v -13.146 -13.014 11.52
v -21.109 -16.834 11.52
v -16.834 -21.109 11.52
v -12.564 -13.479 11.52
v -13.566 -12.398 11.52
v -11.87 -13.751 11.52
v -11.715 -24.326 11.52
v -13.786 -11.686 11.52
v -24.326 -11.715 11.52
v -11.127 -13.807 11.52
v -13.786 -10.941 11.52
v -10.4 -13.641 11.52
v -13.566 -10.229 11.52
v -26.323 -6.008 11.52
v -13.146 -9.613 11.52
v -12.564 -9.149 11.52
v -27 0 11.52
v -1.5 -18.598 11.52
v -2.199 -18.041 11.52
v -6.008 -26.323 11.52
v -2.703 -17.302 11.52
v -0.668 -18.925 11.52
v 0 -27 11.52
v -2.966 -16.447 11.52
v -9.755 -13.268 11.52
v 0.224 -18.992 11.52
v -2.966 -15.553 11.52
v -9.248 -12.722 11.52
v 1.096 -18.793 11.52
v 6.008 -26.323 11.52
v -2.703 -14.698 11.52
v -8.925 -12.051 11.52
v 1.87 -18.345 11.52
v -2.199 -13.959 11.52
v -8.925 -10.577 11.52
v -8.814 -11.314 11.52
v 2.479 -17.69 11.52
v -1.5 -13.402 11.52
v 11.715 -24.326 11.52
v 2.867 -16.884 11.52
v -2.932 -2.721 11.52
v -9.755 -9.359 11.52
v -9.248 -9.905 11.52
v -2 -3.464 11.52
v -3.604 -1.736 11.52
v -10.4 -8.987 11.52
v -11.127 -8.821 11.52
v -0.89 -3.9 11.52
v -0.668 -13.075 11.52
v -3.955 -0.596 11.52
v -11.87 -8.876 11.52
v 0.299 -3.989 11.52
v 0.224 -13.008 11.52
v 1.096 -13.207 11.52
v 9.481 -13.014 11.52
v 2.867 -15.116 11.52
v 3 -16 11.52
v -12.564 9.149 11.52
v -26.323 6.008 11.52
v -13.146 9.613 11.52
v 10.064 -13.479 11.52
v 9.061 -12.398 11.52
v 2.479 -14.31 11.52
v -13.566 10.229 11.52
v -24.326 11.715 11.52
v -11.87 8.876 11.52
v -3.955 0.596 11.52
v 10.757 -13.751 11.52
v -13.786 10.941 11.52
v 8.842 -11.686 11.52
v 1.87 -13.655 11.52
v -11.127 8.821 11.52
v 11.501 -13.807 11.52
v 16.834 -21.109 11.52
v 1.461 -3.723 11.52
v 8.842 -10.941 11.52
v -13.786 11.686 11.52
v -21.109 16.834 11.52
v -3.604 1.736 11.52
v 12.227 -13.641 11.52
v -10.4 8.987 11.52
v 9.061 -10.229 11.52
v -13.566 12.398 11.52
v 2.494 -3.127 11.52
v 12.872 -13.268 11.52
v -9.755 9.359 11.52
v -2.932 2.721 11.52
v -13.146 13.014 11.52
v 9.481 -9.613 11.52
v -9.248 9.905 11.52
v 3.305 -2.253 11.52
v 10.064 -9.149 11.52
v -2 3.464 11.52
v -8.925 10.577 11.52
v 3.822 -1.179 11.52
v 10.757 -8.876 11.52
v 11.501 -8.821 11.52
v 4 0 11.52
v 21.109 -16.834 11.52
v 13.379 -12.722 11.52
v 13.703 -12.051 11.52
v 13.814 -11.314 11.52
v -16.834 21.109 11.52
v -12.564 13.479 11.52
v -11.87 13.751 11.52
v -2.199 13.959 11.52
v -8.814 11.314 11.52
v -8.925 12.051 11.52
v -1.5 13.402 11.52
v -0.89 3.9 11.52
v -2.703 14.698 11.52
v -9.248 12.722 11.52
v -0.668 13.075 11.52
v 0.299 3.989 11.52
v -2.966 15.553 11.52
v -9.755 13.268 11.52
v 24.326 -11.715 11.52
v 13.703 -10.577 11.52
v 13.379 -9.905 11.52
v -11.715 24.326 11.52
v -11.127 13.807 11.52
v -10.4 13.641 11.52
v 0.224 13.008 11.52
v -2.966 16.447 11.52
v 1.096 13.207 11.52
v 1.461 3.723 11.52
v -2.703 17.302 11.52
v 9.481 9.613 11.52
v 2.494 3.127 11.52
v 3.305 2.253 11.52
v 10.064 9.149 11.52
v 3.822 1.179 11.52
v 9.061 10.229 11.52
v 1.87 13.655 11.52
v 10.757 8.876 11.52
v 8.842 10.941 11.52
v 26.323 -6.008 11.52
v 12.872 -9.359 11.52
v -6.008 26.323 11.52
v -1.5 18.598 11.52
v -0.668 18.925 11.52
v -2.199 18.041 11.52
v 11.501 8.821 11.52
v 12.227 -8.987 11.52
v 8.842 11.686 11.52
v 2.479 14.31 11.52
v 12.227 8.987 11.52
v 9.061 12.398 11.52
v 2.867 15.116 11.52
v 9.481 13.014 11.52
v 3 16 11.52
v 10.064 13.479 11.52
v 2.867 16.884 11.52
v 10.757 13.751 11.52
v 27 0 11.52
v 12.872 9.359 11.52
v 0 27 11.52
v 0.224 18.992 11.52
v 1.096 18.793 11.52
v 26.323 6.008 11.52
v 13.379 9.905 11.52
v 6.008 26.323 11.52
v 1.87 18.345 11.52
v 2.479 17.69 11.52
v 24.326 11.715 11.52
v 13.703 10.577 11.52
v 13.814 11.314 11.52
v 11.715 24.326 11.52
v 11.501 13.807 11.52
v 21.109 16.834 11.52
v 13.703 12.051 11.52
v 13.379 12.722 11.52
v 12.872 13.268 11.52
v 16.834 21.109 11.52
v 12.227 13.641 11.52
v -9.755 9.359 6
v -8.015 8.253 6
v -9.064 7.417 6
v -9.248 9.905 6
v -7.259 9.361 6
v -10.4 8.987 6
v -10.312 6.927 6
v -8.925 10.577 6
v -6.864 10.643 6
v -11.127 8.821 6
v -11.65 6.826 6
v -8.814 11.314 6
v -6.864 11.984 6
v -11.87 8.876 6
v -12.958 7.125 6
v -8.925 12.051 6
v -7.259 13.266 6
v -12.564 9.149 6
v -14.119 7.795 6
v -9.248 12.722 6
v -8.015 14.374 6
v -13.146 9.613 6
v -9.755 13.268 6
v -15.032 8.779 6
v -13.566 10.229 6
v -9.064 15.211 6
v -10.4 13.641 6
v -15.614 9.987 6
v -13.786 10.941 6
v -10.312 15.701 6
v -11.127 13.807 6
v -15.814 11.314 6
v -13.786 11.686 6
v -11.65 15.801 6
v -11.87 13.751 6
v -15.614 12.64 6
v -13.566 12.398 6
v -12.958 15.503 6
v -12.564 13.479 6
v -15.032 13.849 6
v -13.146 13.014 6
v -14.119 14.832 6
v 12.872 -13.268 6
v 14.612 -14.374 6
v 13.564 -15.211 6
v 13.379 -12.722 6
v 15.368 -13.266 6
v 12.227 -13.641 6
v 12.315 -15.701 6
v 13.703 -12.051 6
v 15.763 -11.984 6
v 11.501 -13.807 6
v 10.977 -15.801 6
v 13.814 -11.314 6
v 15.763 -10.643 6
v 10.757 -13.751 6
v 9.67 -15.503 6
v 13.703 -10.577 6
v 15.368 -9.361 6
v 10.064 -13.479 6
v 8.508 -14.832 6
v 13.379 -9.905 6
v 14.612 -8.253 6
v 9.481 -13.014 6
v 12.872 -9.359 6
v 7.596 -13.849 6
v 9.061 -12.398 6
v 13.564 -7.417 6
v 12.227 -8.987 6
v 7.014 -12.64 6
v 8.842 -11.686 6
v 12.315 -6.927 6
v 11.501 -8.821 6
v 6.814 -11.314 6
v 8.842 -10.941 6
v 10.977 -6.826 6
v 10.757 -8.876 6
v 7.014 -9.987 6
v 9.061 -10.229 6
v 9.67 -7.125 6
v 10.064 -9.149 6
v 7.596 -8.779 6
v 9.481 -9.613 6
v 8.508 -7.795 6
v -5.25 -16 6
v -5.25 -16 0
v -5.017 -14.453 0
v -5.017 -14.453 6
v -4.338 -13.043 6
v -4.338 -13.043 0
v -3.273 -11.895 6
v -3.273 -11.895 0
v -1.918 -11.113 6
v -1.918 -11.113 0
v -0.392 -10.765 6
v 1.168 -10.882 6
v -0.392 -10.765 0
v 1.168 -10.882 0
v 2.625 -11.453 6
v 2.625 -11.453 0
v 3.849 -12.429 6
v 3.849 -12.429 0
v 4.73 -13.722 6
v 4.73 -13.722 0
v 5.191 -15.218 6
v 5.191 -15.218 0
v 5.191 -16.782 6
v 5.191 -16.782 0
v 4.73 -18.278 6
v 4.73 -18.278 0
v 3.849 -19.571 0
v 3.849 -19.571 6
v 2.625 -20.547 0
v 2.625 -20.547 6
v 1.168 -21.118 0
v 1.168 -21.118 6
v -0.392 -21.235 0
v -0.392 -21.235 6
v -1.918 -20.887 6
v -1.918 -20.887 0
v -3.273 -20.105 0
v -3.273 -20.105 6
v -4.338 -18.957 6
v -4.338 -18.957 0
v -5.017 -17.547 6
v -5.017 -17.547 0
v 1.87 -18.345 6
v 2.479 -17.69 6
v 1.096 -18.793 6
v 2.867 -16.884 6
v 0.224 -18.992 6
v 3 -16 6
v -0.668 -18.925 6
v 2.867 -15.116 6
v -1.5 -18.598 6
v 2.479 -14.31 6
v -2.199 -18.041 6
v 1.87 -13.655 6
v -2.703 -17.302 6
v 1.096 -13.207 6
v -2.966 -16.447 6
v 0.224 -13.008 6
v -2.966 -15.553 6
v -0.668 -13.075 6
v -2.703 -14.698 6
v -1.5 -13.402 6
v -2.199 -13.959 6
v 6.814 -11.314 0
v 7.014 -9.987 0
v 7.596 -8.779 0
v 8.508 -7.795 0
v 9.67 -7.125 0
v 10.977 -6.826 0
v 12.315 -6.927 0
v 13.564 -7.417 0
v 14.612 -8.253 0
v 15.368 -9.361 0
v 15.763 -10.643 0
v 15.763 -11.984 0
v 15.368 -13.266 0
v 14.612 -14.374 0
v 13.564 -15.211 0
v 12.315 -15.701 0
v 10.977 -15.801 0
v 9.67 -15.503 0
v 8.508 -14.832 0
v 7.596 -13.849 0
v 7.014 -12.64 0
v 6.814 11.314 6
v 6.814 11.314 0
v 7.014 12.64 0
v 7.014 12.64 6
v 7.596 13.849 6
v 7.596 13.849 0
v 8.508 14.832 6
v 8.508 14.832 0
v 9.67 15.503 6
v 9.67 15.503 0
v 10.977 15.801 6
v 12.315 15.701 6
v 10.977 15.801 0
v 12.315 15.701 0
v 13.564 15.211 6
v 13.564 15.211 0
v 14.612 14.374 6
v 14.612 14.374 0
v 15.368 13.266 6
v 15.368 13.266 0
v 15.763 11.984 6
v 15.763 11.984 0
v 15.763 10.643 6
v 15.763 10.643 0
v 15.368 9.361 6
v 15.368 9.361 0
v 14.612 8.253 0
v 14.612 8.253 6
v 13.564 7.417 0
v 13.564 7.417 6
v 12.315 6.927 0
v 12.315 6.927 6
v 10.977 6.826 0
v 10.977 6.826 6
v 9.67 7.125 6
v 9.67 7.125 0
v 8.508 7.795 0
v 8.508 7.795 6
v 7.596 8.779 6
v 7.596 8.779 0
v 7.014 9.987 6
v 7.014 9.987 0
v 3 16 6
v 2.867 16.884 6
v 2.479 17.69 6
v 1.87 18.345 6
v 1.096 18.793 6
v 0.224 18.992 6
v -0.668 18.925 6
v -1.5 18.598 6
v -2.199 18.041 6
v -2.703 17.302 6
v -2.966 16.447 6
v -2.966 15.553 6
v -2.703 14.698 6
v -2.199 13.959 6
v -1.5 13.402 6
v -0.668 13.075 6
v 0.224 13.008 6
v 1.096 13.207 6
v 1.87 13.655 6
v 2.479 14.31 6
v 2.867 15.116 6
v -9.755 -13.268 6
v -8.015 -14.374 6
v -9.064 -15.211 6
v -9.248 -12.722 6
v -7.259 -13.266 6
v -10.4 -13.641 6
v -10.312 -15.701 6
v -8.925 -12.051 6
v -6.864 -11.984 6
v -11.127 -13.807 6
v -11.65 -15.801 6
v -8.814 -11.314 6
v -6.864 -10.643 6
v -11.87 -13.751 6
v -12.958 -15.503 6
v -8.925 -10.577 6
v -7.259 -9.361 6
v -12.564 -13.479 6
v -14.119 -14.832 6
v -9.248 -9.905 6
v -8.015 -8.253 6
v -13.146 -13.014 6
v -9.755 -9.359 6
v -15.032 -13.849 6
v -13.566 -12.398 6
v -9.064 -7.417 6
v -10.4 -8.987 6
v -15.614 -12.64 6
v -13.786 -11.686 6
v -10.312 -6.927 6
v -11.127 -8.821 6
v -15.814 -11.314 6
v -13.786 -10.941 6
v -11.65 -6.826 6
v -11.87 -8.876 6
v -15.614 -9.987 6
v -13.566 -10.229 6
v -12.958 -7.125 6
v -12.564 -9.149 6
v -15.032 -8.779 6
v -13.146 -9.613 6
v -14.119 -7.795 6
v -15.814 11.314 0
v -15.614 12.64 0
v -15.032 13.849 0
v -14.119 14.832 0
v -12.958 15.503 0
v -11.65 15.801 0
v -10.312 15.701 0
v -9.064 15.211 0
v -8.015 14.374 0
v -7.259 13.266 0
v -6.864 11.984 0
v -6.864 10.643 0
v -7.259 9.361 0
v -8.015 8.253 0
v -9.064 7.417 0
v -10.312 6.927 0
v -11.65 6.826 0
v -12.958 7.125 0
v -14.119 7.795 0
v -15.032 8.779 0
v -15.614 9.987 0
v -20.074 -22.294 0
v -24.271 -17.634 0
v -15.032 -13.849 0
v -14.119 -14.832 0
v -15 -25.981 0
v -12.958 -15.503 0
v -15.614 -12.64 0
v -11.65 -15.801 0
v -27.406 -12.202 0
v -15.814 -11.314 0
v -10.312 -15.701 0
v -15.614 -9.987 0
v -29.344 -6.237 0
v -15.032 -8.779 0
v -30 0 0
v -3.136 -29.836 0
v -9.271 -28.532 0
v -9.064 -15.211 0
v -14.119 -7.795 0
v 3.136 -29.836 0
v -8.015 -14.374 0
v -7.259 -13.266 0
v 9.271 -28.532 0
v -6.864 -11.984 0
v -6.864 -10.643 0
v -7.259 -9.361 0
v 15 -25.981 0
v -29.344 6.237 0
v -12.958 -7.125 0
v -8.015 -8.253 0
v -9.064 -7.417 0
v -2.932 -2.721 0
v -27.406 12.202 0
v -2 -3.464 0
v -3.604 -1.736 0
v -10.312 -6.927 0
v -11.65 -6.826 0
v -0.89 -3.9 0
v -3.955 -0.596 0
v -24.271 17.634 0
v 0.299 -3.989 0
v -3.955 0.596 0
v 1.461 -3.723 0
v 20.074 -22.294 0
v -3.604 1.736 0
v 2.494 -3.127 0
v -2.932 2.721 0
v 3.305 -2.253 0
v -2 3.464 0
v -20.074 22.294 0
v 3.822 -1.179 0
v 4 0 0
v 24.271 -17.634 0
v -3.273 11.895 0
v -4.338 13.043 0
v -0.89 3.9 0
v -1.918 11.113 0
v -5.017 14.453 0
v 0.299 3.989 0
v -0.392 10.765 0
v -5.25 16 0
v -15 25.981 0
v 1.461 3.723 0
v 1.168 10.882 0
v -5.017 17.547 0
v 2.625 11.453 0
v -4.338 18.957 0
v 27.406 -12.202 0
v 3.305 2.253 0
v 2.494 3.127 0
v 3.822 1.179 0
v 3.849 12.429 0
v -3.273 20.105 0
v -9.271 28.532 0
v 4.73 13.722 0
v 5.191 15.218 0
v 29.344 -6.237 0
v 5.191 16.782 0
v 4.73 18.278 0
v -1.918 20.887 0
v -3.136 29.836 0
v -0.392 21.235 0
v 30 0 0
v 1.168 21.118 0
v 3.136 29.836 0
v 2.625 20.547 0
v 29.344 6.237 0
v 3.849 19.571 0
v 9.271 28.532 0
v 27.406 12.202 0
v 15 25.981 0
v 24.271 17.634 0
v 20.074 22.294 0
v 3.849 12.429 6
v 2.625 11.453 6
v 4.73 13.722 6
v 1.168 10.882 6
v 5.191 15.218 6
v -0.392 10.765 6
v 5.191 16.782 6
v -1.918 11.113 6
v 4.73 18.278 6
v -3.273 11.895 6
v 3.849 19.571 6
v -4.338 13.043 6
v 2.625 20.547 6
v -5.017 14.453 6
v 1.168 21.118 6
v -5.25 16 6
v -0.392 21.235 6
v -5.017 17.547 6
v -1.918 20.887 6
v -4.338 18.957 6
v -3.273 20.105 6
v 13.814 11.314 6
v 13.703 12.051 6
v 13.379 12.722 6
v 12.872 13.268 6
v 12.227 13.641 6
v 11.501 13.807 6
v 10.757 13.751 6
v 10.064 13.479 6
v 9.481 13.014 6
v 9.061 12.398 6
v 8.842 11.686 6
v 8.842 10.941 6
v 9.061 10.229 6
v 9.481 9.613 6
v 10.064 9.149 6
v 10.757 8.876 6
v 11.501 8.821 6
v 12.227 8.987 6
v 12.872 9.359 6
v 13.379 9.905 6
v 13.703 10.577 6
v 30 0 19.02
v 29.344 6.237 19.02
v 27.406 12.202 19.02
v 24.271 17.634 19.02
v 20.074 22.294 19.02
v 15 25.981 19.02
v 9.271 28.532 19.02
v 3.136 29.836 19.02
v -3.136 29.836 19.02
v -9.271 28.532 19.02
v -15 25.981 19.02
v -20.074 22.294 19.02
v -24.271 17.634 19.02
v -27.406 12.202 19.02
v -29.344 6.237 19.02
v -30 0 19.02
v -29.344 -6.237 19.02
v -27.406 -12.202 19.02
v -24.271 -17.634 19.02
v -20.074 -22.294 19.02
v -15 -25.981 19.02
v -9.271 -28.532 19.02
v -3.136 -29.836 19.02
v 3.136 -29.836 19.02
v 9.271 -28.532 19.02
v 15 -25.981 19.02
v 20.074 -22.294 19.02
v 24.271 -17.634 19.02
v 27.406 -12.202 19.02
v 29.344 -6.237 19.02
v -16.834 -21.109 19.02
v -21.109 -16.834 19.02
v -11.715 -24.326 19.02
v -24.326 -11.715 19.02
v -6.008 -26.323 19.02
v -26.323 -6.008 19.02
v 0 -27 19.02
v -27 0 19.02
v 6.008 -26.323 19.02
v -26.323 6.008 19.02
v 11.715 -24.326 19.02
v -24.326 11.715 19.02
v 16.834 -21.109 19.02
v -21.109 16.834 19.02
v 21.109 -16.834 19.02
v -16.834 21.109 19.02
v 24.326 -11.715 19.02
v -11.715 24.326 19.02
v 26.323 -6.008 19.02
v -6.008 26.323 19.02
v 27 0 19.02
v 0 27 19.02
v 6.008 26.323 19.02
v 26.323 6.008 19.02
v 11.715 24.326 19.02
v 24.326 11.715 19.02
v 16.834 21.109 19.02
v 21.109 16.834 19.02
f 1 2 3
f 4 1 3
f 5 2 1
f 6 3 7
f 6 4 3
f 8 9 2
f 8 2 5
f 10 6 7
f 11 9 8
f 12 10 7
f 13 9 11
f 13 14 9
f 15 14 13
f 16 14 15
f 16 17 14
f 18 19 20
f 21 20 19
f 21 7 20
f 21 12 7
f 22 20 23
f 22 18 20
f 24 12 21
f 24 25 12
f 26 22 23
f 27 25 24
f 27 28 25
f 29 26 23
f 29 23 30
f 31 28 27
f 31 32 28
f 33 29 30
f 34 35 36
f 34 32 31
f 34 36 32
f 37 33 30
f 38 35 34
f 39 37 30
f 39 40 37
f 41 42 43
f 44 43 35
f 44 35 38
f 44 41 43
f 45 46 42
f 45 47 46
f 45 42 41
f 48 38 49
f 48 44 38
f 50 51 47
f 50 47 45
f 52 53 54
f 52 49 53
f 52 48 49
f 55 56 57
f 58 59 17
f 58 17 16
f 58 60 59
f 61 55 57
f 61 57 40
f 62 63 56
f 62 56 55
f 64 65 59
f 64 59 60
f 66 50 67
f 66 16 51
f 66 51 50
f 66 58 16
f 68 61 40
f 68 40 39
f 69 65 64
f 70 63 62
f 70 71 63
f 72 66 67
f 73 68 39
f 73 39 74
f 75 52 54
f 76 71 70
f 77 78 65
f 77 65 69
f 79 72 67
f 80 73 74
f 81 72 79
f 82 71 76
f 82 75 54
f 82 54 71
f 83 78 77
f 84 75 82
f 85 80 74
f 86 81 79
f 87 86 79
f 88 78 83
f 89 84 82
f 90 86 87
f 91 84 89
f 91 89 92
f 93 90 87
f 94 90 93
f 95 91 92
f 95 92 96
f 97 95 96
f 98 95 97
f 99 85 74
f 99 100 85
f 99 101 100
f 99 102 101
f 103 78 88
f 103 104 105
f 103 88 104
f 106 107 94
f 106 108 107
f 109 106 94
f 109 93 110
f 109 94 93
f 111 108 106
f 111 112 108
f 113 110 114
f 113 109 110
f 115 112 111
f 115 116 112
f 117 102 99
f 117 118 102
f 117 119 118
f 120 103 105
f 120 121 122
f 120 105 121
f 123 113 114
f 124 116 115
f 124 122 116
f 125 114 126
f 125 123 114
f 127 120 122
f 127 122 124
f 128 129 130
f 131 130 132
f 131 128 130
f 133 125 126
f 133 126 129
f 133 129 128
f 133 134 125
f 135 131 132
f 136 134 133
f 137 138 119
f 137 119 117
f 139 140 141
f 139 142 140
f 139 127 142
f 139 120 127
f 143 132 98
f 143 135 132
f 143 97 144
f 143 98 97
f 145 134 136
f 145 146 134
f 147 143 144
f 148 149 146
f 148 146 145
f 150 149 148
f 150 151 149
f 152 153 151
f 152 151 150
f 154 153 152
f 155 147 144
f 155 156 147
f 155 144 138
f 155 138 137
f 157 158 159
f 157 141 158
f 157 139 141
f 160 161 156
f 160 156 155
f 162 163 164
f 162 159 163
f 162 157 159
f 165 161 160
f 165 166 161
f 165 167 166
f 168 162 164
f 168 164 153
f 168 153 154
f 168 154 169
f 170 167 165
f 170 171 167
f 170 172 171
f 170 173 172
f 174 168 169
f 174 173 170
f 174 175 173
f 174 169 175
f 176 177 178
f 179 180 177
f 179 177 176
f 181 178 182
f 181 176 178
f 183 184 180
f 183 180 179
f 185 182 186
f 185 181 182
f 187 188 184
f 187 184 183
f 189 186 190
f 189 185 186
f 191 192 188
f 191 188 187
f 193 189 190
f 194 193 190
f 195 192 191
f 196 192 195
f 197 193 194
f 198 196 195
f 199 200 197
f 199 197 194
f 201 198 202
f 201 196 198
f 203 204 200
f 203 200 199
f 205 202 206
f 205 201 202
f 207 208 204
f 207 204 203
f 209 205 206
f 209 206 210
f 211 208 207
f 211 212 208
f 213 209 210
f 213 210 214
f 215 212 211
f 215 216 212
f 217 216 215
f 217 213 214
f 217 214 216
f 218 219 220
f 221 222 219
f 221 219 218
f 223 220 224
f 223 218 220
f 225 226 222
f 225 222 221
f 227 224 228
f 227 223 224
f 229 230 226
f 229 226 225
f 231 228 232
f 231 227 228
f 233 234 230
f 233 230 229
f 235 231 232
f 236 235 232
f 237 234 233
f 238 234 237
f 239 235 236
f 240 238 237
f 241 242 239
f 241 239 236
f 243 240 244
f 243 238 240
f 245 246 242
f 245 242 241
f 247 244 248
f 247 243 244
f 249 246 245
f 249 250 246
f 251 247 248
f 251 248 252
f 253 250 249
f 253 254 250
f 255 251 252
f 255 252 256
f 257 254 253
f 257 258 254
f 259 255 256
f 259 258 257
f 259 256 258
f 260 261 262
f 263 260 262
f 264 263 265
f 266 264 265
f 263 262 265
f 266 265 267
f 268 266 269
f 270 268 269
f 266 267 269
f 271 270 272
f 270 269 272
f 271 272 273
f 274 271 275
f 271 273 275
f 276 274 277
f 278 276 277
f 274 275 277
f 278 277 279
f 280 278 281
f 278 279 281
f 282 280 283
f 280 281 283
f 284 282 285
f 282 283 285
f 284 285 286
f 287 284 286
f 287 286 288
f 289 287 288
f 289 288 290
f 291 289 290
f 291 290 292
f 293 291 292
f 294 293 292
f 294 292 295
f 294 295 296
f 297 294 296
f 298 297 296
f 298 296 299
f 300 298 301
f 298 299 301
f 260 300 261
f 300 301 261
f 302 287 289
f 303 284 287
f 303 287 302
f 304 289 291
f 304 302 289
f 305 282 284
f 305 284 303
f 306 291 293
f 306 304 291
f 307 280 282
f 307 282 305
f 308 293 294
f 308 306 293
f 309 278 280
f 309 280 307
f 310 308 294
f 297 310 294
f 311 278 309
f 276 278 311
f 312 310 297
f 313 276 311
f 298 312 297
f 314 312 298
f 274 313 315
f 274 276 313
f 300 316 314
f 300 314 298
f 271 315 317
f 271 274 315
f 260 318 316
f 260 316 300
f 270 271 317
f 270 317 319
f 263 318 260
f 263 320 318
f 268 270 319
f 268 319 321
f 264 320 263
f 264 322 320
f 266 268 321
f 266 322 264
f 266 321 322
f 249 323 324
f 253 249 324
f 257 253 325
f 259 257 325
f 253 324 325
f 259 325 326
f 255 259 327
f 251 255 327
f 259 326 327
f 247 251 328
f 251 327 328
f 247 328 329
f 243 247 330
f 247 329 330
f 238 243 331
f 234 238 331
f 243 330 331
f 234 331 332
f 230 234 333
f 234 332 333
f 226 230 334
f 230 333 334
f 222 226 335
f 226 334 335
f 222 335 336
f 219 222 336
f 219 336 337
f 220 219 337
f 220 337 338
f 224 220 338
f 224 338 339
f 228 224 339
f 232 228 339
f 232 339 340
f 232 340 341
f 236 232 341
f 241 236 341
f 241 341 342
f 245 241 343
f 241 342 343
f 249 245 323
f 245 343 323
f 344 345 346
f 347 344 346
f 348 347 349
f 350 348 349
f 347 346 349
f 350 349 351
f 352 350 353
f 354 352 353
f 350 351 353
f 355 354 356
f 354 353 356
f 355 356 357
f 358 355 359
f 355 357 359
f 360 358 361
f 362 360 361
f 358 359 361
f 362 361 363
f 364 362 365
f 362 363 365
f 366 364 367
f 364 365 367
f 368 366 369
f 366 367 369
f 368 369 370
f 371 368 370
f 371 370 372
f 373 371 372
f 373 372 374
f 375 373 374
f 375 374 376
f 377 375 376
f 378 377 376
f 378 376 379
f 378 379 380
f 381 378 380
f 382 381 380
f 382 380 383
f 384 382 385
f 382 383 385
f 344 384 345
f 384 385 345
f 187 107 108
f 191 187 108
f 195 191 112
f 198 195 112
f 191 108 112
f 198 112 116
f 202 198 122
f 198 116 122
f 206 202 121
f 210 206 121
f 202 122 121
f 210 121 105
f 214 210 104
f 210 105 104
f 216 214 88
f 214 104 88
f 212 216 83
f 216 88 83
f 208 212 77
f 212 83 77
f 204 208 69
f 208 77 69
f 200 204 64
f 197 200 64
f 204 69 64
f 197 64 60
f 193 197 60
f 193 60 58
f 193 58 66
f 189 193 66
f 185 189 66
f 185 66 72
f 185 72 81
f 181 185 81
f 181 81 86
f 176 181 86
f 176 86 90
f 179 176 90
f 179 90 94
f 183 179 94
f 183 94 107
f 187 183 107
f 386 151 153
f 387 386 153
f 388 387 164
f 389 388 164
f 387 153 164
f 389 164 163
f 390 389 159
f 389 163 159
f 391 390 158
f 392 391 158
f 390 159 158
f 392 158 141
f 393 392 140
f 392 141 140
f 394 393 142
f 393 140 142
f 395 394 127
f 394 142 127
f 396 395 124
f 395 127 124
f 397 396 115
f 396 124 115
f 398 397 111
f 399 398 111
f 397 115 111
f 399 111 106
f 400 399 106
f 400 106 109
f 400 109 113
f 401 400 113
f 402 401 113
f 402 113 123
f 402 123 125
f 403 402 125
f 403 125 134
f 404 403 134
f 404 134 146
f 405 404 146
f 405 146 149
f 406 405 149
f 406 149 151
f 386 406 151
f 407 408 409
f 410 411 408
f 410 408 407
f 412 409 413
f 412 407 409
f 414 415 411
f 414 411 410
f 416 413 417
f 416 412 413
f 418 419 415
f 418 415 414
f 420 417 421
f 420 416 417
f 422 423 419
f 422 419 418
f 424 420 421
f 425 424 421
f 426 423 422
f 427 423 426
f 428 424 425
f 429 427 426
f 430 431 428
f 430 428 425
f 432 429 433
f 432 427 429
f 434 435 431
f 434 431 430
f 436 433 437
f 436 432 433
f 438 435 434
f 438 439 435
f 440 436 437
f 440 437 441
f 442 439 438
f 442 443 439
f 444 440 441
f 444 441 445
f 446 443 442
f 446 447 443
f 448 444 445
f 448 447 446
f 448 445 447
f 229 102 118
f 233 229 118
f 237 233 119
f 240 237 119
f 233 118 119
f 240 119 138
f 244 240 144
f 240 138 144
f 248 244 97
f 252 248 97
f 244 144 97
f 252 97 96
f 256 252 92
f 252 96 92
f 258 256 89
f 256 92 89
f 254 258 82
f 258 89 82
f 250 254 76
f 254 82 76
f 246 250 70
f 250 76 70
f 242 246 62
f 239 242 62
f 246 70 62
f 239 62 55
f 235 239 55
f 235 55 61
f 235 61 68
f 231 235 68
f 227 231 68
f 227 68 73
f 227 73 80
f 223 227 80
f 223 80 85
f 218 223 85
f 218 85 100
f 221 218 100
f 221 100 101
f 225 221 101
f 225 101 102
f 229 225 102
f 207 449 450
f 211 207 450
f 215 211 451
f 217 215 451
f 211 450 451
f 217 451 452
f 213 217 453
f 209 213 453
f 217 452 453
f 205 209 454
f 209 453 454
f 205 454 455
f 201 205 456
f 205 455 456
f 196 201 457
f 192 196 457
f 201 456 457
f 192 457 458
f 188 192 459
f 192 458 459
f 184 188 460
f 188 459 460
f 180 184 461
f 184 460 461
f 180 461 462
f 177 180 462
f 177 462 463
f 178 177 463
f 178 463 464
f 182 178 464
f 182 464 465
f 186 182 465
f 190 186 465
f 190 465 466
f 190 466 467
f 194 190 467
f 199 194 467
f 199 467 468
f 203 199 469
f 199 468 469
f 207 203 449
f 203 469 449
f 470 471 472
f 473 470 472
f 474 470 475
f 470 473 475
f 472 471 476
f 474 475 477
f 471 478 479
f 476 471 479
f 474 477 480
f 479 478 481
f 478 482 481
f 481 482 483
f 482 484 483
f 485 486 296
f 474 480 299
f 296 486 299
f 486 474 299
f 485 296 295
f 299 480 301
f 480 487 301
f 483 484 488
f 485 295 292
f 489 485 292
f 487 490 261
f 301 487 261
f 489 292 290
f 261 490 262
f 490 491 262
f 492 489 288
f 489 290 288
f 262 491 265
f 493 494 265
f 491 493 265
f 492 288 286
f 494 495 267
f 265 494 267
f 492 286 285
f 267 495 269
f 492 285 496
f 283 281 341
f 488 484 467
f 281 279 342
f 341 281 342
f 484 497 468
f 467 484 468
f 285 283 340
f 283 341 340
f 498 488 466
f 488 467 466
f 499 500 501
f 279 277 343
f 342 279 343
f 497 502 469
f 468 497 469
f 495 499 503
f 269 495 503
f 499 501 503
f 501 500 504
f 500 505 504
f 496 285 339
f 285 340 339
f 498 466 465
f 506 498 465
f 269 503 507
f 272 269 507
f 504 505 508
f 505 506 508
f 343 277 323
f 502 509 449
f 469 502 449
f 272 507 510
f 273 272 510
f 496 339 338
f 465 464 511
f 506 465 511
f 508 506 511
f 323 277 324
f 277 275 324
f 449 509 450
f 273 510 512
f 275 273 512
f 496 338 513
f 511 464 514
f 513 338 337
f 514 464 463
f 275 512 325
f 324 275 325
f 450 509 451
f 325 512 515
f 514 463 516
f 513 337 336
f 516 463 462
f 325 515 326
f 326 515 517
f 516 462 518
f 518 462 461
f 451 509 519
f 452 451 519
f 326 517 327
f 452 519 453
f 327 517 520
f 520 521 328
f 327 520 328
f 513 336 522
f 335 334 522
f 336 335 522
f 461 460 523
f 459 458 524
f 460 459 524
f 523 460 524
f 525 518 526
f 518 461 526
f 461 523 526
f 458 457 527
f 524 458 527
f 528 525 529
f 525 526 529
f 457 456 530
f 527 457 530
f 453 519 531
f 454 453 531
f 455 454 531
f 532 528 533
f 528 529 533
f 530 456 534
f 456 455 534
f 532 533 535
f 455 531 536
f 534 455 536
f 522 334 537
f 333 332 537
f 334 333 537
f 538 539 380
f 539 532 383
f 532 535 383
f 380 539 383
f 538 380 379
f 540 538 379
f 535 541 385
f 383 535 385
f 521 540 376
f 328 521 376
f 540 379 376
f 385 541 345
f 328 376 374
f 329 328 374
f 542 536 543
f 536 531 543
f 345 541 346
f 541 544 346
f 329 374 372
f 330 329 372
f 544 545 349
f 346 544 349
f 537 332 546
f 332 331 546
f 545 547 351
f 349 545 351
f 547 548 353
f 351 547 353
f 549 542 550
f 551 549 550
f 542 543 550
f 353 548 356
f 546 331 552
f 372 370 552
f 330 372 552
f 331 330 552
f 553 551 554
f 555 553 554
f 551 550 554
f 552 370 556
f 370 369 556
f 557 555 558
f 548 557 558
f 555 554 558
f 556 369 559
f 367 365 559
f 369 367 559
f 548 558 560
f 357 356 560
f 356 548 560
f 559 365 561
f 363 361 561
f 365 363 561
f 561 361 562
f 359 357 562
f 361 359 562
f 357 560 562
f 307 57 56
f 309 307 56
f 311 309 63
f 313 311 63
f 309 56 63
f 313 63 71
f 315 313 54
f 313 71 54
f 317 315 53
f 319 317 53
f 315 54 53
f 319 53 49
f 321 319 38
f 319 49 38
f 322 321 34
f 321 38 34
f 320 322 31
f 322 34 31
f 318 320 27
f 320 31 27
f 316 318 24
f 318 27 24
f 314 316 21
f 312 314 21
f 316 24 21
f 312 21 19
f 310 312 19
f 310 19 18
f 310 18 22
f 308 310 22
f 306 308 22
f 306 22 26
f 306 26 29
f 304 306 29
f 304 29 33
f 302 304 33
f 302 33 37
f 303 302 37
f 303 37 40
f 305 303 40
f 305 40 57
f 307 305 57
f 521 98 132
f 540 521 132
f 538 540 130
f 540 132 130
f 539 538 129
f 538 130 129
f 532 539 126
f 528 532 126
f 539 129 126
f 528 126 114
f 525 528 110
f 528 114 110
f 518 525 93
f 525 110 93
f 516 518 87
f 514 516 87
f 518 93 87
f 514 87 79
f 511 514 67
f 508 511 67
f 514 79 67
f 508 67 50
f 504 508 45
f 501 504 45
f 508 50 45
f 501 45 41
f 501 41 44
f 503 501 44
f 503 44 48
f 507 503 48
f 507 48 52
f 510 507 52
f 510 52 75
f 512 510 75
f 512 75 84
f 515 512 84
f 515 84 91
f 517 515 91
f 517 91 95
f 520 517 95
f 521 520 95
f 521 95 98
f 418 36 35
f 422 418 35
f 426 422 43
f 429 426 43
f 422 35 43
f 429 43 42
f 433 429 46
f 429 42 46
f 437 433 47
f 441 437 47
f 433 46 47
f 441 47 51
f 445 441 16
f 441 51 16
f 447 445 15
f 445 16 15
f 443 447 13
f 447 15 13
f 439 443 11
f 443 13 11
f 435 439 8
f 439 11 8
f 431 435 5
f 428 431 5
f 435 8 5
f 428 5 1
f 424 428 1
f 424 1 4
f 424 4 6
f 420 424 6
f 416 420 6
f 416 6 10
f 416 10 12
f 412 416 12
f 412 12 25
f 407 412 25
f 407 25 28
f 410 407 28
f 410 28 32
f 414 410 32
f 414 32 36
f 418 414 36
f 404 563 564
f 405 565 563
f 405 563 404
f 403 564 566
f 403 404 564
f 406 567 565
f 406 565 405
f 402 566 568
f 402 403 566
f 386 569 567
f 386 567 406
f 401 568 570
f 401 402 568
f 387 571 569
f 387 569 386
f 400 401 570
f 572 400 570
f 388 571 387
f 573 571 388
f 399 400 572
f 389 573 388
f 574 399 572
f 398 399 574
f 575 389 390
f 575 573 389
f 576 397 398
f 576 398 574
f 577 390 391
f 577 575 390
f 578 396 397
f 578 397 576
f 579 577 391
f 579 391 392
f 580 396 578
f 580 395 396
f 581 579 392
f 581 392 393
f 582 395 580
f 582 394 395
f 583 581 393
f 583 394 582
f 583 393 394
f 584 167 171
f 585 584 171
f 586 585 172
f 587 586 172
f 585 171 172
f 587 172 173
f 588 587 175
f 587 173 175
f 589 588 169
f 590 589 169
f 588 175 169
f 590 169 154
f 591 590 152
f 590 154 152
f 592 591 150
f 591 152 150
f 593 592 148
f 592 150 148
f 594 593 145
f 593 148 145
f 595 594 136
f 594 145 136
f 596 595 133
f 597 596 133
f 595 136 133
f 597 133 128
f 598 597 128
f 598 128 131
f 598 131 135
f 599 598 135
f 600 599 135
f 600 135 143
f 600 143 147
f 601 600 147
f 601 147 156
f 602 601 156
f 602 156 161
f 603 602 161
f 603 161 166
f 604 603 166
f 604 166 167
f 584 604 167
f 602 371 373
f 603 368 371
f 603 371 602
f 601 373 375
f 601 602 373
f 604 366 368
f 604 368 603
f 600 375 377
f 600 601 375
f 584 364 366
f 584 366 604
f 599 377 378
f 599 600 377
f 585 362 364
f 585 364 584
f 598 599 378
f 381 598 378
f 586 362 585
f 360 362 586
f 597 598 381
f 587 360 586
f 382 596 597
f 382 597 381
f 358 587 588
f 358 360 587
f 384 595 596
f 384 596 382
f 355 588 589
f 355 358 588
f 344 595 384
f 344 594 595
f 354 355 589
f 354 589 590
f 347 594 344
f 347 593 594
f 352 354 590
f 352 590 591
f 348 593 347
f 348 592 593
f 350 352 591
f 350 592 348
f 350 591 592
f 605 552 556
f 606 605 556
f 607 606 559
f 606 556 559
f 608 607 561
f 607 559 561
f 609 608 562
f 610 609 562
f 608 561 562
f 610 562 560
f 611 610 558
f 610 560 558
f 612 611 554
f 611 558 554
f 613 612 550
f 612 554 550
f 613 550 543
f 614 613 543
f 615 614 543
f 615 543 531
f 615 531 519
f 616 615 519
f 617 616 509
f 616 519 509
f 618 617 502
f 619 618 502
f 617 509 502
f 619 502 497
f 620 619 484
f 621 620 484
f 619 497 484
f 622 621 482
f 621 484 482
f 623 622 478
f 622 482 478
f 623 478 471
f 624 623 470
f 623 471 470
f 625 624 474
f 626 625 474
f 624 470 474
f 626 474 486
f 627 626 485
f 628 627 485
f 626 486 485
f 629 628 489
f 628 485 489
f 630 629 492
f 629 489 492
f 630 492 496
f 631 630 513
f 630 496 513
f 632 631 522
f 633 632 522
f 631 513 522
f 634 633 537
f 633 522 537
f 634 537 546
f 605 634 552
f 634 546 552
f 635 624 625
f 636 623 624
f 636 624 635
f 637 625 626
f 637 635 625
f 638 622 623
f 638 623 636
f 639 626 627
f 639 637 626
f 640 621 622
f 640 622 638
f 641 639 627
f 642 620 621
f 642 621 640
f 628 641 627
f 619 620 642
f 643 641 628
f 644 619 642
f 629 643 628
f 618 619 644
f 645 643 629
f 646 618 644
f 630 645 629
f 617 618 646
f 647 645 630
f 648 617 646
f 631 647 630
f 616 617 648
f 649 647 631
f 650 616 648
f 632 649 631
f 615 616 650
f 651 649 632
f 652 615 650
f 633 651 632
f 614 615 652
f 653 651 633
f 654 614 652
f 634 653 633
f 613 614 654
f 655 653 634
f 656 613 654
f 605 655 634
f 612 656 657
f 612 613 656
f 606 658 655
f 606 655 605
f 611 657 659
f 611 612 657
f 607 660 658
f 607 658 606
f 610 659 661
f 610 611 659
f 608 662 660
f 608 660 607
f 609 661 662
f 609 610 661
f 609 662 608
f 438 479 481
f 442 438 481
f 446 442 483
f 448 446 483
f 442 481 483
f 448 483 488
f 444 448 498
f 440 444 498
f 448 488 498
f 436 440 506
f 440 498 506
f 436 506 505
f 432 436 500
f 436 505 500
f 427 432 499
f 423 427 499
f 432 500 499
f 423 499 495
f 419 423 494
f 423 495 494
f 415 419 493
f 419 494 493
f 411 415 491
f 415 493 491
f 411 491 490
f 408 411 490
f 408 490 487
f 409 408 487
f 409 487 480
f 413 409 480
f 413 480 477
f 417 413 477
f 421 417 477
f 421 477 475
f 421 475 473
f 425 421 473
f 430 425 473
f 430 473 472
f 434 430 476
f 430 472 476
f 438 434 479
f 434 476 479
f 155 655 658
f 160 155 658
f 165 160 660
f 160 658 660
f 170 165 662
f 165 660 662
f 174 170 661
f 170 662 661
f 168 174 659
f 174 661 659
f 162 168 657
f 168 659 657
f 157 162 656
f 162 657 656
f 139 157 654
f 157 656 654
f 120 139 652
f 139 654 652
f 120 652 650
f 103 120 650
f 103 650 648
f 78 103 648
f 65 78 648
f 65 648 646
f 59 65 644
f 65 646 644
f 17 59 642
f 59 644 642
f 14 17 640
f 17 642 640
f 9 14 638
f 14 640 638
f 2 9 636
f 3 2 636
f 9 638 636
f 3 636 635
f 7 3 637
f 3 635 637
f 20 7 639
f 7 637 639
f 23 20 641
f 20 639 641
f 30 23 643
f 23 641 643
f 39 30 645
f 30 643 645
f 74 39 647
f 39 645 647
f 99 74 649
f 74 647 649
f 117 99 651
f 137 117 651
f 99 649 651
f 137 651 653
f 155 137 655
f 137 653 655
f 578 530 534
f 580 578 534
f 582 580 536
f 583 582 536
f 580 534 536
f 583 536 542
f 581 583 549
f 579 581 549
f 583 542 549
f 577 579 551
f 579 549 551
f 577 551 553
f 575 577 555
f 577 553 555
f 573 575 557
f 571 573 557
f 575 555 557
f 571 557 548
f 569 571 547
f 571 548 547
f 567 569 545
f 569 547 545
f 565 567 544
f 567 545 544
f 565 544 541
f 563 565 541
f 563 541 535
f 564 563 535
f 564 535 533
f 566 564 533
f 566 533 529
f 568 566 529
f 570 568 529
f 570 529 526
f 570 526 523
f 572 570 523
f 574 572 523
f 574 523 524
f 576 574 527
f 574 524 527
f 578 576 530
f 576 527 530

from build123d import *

# Parameters (mm, degrees)
ESBO_O1_R                = 30
RESSALTO_EXTRUS_O1_DEPTH = 19.02
ESBO_O2_R                = 26
CORTE_EXTRUS_O1_DEPTH    = 7
ESBO_O7_R                = 27
CORTE_EXTRUS_O4_DEPTH    = 7.5
ESBO_O13_R               = 3
ESBO_O13_R_2             = 2.5
CORTE_EXTRUS_O10_DEPTH   = 12.52
ESBO_O14_R               = 4
CORTE_EXTRUS_O11_DEPTH   = 12.52
ESBO_O16_R               = 5.25
ESBO_O16_R_2             = 4.5
CORTE_EXTRUS_O12_DEPTH   = 6


with BuildPart() as part:
    # Esboço1 → Ressalto-extrusão1 (new body)
    with BuildSketch(Plane.XY):
        Circle(ESBO_O1_R)
    extrude(amount=RESSALTO_EXTRUS_O1_DEPTH)

    # Esboço2 → Corte-extrusão1 (cut)
    with BuildSketch(Plane.XY.offset(19.02)):
        Circle(ESBO_O2_R)
    extrude(amount=-CORTE_EXTRUS_O1_DEPTH, mode=Mode.SUBTRACT)

    # Esboço7 → Corte-extrusão4 (cut)
    with BuildSketch(Plane.XY.offset(19.02)):
        Circle(ESBO_O7_R)
    extrude(amount=-CORTE_EXTRUS_O4_DEPTH, mode=Mode.SUBTRACT)

    # Esboço13 → Corte-extrusão10 (cut, through all)
    with BuildSketch(Plane.XY.offset(11.52)):
        with Locations((0, 16)):
            Circle(ESBO_O13_R)
        with Locations((0, -16)):
            Circle(ESBO_O13_R)
        with Locations((-11.313708499, 11.313708499)):
            Circle(ESBO_O13_R_2)
        with Locations((11.313708499, 11.313708499)):
            Circle(ESBO_O13_R_2)
        with Locations((-11.313708499, -11.313708499)):
            Circle(ESBO_O13_R_2)
        with Locations((11.313708499, -11.313708499)):
            Circle(ESBO_O13_R_2)
    extrude(amount=-CORTE_EXTRUS_O10_DEPTH, mode=Mode.SUBTRACT)

    # Esboço14 → Corte-extrusão11 (cut, through all)
    with BuildSketch(Plane.XY.offset(11.52)):
        Circle(ESBO_O14_R)
    extrude(amount=-CORTE_EXTRUS_O11_DEPTH, mode=Mode.SUBTRACT)

    # Esboço16 → Corte-extrusão12 (cut)
    with BuildSketch(Plane(origin=(0, 0, 0), x_dir=(-1, 0, 0), z_dir=(0, 0, -1))):
        with Locations((0, 16)):
            Circle(ESBO_O16_R)
        with Locations((0, -16)):
            Circle(ESBO_O16_R)
        with Locations((11.313708499, 11.313708499)):
            Circle(ESBO_O16_R_2)
        with Locations((-11.313708499, 11.313708499)):
            Circle(ESBO_O16_R_2)
        with Locations((-11.313708499, -11.313708499)):
            Circle(ESBO_O16_R_2)
        with Locations((11.313708499, -11.313708499)):
            Circle(ESBO_O16_R_2)
    extrude(amount=-CORTE_EXTRUS_O12_DEPTH, mode=Mode.SUBTRACT)


solid = part.part
